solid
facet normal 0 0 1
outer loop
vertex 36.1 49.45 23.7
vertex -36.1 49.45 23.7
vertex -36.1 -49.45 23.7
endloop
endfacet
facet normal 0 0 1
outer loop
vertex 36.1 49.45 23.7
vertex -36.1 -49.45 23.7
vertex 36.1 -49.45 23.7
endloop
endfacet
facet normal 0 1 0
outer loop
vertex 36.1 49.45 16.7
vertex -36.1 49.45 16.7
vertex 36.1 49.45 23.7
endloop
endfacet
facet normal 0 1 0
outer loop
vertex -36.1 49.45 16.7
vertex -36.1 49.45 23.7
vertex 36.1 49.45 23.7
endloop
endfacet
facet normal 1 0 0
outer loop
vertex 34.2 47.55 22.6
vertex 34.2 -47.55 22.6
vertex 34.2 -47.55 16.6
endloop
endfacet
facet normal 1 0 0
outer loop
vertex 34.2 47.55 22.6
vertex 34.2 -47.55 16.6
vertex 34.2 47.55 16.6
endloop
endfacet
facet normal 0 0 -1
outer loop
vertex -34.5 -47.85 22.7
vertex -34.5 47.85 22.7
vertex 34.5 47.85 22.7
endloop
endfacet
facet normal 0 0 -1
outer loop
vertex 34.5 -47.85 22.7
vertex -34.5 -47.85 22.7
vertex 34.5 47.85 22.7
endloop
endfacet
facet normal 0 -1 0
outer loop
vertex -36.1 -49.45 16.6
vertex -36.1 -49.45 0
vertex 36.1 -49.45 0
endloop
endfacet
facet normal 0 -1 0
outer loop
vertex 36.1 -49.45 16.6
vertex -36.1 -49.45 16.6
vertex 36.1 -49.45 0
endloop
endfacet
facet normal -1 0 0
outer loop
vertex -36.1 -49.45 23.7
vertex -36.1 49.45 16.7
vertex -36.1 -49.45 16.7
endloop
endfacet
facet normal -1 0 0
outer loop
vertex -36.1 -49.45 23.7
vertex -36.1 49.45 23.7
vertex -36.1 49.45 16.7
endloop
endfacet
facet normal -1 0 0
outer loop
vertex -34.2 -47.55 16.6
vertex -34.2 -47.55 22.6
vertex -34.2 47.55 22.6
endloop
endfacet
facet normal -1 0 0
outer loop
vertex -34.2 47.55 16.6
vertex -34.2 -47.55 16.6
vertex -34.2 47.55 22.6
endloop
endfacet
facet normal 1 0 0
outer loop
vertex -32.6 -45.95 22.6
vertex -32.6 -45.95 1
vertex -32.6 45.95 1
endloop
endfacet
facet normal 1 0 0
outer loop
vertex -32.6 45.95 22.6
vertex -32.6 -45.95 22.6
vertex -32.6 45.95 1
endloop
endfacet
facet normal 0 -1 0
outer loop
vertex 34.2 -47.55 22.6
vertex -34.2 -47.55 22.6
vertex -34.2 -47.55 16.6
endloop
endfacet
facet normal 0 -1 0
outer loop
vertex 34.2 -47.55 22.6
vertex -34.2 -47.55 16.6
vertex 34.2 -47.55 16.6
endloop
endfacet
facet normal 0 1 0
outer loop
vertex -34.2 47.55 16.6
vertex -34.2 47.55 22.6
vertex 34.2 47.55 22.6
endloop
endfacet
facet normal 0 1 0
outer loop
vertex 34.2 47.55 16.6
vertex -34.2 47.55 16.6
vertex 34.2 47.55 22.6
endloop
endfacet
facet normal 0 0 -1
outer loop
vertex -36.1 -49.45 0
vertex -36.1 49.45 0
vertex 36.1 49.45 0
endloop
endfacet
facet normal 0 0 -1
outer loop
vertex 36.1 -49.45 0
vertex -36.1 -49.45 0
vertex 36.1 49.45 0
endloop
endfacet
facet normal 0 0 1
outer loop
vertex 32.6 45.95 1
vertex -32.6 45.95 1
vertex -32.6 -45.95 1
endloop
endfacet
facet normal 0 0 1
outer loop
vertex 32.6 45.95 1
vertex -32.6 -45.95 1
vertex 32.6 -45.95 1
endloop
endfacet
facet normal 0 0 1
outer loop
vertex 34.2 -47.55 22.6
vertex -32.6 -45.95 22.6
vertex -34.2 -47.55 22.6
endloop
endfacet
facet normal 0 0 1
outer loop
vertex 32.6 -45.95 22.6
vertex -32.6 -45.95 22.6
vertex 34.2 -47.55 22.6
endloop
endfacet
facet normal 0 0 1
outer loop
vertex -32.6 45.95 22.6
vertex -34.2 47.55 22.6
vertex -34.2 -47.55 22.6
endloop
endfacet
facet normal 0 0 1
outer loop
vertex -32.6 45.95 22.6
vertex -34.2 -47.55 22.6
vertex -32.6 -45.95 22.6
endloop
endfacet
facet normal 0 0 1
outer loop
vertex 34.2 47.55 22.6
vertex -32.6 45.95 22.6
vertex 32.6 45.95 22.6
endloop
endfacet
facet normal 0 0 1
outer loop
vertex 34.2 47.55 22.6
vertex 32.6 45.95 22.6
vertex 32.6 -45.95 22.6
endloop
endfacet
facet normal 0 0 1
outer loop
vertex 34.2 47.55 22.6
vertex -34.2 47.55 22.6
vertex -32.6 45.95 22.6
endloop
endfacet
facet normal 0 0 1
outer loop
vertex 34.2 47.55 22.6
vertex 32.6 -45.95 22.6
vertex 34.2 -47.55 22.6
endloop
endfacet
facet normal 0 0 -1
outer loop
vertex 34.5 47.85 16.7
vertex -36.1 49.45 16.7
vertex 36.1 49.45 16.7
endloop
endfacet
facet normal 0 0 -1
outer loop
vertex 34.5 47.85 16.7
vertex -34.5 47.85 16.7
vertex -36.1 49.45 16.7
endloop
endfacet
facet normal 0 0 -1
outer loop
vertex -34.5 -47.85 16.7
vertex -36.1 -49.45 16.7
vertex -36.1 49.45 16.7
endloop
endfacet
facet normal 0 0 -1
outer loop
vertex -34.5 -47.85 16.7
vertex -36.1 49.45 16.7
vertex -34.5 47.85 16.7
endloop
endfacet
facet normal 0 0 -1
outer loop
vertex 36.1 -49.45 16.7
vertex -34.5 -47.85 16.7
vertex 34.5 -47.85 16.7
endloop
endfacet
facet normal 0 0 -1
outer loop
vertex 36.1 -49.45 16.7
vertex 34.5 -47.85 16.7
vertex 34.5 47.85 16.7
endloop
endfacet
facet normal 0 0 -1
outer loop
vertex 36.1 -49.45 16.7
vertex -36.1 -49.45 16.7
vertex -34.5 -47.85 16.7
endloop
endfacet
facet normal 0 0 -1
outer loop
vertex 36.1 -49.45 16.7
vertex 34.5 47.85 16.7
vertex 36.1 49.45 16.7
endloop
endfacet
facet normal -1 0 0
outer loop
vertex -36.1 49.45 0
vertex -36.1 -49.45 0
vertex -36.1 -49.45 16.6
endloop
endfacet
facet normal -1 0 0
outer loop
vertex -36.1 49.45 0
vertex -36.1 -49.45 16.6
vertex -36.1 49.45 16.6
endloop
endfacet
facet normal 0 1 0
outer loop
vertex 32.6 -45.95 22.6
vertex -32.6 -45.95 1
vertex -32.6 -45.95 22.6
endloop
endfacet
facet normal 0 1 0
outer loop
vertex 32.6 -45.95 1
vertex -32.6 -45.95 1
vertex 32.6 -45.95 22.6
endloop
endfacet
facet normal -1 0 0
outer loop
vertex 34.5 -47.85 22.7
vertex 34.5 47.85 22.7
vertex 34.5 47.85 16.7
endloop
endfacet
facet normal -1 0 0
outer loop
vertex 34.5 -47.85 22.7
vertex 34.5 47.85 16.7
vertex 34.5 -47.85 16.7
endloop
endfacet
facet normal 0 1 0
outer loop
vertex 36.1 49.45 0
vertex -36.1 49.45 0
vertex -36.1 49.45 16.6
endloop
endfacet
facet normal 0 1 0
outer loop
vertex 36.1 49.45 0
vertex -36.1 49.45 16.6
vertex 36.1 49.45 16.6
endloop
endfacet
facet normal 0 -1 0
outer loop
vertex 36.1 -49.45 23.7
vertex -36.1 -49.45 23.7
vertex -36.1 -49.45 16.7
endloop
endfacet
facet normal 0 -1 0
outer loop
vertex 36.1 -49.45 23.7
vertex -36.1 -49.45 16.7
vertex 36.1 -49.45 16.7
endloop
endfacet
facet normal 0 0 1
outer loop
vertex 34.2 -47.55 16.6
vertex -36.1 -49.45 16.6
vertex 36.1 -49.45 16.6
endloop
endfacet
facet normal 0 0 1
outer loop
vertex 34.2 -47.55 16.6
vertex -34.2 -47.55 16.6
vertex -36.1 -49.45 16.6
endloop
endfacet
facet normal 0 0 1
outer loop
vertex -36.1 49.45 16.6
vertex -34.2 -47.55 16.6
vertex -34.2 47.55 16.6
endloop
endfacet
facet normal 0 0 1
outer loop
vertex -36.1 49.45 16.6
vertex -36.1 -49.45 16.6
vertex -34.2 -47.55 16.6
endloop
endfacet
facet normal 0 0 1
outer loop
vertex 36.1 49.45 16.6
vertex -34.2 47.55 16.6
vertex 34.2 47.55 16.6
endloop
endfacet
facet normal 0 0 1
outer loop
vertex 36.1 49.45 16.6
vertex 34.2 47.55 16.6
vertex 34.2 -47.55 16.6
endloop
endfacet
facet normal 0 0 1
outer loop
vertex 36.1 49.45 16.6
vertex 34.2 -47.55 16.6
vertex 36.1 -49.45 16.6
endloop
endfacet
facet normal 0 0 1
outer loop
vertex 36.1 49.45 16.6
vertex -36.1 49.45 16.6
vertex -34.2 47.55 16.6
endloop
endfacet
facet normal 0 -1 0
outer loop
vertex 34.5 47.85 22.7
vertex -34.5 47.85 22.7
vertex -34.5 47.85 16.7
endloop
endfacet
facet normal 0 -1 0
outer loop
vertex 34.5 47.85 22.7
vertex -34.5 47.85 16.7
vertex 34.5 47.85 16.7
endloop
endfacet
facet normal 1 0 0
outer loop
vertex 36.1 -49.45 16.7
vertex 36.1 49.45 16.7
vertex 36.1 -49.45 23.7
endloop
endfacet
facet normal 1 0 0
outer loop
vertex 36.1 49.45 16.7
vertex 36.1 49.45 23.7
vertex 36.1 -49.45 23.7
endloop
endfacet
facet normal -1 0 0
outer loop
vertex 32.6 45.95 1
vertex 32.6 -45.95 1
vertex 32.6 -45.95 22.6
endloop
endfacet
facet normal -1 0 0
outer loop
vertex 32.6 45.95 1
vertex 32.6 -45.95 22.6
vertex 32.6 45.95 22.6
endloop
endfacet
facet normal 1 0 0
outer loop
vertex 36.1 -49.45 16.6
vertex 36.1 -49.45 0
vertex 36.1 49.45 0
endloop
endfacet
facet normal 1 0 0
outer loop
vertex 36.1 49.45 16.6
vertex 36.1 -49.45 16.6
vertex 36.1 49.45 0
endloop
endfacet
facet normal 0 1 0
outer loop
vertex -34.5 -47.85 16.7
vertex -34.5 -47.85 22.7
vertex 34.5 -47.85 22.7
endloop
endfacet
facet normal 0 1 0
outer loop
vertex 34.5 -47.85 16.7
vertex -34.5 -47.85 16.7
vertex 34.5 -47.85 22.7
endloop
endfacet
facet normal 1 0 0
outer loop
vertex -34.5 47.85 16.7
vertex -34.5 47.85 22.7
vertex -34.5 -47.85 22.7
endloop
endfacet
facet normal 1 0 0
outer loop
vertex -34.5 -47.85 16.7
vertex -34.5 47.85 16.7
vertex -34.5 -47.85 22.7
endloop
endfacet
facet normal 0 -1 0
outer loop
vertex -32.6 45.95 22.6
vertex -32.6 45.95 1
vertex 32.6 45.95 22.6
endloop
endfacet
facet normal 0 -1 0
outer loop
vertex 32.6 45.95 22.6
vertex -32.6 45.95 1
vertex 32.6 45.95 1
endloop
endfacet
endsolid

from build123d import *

# Parameters (mm, degrees)
F3_W      = 72.2
F3_H      = 98.9
F4_DEPTH  = 1
F5_W      = 72.2
F5_H      = 98.9
F5_W_2    = 65.2
F5_H_2    = 91.9
F6_DEPTH  = 21.6
F8_W      = 72.2
F8_H      = 98.9
F8_W_2    = 68.4
F8_H_2    = 95.1
F9_DEPTH  = 6
F10_W     = 72.2
F10_H     = 98.9
F11_DEPTH = 1
F12_W     = 72.2
F12_H     = 98.9
F12_W_2   = 69
F12_H_2   = 95.7
F13_DEPTH = 6


with BuildPart() as f4:
    # F3 (on Top) → F4 (new body)
    with BuildSketch(Plane.XY):
        Rectangle(F3_W, F3_H)
    extrude(amount=F4_DEPTH)

    # F5 (on face) → F6 (join)
    with BuildSketch(Plane.XY.offset(1)):
        Rectangle(F5_W, F5_H)
        Rectangle(F5_W_2, F5_H_2, mode=Mode.SUBTRACT)
    extrude(amount=F6_DEPTH)

    # F8 (on face) → F9 (cut)
    with BuildSketch(Plane.XY.offset(22.6)):
        Rectangle(F8_W, F8_H)
        Rectangle(F8_W_2, F8_H_2, mode=Mode.SUBTRACT)
    extrude(amount=-F9_DEPTH, mode=Mode.SUBTRACT)


with BuildPart() as f11:
    # F10 (on face) → F11 (new body)
    with BuildSketch(Plane.XY.offset(22.7)):
        Rectangle(F10_W, F10_H)
    extrude(amount=F11_DEPTH)

    # F12 (on face) → F13 (join)
    with BuildSketch(Plane(origin=(0, 0, 22.7), x_dir=(1, 0, 0), z_dir=(0, 0, -1))):
        Rectangle(F12_W, F12_H)
        Rectangle(F12_W_2, F12_H_2, mode=Mode.SUBTRACT)
    extrude(amount=F13_DEPTH)


solid = Compound([f4.part, f11.part])
